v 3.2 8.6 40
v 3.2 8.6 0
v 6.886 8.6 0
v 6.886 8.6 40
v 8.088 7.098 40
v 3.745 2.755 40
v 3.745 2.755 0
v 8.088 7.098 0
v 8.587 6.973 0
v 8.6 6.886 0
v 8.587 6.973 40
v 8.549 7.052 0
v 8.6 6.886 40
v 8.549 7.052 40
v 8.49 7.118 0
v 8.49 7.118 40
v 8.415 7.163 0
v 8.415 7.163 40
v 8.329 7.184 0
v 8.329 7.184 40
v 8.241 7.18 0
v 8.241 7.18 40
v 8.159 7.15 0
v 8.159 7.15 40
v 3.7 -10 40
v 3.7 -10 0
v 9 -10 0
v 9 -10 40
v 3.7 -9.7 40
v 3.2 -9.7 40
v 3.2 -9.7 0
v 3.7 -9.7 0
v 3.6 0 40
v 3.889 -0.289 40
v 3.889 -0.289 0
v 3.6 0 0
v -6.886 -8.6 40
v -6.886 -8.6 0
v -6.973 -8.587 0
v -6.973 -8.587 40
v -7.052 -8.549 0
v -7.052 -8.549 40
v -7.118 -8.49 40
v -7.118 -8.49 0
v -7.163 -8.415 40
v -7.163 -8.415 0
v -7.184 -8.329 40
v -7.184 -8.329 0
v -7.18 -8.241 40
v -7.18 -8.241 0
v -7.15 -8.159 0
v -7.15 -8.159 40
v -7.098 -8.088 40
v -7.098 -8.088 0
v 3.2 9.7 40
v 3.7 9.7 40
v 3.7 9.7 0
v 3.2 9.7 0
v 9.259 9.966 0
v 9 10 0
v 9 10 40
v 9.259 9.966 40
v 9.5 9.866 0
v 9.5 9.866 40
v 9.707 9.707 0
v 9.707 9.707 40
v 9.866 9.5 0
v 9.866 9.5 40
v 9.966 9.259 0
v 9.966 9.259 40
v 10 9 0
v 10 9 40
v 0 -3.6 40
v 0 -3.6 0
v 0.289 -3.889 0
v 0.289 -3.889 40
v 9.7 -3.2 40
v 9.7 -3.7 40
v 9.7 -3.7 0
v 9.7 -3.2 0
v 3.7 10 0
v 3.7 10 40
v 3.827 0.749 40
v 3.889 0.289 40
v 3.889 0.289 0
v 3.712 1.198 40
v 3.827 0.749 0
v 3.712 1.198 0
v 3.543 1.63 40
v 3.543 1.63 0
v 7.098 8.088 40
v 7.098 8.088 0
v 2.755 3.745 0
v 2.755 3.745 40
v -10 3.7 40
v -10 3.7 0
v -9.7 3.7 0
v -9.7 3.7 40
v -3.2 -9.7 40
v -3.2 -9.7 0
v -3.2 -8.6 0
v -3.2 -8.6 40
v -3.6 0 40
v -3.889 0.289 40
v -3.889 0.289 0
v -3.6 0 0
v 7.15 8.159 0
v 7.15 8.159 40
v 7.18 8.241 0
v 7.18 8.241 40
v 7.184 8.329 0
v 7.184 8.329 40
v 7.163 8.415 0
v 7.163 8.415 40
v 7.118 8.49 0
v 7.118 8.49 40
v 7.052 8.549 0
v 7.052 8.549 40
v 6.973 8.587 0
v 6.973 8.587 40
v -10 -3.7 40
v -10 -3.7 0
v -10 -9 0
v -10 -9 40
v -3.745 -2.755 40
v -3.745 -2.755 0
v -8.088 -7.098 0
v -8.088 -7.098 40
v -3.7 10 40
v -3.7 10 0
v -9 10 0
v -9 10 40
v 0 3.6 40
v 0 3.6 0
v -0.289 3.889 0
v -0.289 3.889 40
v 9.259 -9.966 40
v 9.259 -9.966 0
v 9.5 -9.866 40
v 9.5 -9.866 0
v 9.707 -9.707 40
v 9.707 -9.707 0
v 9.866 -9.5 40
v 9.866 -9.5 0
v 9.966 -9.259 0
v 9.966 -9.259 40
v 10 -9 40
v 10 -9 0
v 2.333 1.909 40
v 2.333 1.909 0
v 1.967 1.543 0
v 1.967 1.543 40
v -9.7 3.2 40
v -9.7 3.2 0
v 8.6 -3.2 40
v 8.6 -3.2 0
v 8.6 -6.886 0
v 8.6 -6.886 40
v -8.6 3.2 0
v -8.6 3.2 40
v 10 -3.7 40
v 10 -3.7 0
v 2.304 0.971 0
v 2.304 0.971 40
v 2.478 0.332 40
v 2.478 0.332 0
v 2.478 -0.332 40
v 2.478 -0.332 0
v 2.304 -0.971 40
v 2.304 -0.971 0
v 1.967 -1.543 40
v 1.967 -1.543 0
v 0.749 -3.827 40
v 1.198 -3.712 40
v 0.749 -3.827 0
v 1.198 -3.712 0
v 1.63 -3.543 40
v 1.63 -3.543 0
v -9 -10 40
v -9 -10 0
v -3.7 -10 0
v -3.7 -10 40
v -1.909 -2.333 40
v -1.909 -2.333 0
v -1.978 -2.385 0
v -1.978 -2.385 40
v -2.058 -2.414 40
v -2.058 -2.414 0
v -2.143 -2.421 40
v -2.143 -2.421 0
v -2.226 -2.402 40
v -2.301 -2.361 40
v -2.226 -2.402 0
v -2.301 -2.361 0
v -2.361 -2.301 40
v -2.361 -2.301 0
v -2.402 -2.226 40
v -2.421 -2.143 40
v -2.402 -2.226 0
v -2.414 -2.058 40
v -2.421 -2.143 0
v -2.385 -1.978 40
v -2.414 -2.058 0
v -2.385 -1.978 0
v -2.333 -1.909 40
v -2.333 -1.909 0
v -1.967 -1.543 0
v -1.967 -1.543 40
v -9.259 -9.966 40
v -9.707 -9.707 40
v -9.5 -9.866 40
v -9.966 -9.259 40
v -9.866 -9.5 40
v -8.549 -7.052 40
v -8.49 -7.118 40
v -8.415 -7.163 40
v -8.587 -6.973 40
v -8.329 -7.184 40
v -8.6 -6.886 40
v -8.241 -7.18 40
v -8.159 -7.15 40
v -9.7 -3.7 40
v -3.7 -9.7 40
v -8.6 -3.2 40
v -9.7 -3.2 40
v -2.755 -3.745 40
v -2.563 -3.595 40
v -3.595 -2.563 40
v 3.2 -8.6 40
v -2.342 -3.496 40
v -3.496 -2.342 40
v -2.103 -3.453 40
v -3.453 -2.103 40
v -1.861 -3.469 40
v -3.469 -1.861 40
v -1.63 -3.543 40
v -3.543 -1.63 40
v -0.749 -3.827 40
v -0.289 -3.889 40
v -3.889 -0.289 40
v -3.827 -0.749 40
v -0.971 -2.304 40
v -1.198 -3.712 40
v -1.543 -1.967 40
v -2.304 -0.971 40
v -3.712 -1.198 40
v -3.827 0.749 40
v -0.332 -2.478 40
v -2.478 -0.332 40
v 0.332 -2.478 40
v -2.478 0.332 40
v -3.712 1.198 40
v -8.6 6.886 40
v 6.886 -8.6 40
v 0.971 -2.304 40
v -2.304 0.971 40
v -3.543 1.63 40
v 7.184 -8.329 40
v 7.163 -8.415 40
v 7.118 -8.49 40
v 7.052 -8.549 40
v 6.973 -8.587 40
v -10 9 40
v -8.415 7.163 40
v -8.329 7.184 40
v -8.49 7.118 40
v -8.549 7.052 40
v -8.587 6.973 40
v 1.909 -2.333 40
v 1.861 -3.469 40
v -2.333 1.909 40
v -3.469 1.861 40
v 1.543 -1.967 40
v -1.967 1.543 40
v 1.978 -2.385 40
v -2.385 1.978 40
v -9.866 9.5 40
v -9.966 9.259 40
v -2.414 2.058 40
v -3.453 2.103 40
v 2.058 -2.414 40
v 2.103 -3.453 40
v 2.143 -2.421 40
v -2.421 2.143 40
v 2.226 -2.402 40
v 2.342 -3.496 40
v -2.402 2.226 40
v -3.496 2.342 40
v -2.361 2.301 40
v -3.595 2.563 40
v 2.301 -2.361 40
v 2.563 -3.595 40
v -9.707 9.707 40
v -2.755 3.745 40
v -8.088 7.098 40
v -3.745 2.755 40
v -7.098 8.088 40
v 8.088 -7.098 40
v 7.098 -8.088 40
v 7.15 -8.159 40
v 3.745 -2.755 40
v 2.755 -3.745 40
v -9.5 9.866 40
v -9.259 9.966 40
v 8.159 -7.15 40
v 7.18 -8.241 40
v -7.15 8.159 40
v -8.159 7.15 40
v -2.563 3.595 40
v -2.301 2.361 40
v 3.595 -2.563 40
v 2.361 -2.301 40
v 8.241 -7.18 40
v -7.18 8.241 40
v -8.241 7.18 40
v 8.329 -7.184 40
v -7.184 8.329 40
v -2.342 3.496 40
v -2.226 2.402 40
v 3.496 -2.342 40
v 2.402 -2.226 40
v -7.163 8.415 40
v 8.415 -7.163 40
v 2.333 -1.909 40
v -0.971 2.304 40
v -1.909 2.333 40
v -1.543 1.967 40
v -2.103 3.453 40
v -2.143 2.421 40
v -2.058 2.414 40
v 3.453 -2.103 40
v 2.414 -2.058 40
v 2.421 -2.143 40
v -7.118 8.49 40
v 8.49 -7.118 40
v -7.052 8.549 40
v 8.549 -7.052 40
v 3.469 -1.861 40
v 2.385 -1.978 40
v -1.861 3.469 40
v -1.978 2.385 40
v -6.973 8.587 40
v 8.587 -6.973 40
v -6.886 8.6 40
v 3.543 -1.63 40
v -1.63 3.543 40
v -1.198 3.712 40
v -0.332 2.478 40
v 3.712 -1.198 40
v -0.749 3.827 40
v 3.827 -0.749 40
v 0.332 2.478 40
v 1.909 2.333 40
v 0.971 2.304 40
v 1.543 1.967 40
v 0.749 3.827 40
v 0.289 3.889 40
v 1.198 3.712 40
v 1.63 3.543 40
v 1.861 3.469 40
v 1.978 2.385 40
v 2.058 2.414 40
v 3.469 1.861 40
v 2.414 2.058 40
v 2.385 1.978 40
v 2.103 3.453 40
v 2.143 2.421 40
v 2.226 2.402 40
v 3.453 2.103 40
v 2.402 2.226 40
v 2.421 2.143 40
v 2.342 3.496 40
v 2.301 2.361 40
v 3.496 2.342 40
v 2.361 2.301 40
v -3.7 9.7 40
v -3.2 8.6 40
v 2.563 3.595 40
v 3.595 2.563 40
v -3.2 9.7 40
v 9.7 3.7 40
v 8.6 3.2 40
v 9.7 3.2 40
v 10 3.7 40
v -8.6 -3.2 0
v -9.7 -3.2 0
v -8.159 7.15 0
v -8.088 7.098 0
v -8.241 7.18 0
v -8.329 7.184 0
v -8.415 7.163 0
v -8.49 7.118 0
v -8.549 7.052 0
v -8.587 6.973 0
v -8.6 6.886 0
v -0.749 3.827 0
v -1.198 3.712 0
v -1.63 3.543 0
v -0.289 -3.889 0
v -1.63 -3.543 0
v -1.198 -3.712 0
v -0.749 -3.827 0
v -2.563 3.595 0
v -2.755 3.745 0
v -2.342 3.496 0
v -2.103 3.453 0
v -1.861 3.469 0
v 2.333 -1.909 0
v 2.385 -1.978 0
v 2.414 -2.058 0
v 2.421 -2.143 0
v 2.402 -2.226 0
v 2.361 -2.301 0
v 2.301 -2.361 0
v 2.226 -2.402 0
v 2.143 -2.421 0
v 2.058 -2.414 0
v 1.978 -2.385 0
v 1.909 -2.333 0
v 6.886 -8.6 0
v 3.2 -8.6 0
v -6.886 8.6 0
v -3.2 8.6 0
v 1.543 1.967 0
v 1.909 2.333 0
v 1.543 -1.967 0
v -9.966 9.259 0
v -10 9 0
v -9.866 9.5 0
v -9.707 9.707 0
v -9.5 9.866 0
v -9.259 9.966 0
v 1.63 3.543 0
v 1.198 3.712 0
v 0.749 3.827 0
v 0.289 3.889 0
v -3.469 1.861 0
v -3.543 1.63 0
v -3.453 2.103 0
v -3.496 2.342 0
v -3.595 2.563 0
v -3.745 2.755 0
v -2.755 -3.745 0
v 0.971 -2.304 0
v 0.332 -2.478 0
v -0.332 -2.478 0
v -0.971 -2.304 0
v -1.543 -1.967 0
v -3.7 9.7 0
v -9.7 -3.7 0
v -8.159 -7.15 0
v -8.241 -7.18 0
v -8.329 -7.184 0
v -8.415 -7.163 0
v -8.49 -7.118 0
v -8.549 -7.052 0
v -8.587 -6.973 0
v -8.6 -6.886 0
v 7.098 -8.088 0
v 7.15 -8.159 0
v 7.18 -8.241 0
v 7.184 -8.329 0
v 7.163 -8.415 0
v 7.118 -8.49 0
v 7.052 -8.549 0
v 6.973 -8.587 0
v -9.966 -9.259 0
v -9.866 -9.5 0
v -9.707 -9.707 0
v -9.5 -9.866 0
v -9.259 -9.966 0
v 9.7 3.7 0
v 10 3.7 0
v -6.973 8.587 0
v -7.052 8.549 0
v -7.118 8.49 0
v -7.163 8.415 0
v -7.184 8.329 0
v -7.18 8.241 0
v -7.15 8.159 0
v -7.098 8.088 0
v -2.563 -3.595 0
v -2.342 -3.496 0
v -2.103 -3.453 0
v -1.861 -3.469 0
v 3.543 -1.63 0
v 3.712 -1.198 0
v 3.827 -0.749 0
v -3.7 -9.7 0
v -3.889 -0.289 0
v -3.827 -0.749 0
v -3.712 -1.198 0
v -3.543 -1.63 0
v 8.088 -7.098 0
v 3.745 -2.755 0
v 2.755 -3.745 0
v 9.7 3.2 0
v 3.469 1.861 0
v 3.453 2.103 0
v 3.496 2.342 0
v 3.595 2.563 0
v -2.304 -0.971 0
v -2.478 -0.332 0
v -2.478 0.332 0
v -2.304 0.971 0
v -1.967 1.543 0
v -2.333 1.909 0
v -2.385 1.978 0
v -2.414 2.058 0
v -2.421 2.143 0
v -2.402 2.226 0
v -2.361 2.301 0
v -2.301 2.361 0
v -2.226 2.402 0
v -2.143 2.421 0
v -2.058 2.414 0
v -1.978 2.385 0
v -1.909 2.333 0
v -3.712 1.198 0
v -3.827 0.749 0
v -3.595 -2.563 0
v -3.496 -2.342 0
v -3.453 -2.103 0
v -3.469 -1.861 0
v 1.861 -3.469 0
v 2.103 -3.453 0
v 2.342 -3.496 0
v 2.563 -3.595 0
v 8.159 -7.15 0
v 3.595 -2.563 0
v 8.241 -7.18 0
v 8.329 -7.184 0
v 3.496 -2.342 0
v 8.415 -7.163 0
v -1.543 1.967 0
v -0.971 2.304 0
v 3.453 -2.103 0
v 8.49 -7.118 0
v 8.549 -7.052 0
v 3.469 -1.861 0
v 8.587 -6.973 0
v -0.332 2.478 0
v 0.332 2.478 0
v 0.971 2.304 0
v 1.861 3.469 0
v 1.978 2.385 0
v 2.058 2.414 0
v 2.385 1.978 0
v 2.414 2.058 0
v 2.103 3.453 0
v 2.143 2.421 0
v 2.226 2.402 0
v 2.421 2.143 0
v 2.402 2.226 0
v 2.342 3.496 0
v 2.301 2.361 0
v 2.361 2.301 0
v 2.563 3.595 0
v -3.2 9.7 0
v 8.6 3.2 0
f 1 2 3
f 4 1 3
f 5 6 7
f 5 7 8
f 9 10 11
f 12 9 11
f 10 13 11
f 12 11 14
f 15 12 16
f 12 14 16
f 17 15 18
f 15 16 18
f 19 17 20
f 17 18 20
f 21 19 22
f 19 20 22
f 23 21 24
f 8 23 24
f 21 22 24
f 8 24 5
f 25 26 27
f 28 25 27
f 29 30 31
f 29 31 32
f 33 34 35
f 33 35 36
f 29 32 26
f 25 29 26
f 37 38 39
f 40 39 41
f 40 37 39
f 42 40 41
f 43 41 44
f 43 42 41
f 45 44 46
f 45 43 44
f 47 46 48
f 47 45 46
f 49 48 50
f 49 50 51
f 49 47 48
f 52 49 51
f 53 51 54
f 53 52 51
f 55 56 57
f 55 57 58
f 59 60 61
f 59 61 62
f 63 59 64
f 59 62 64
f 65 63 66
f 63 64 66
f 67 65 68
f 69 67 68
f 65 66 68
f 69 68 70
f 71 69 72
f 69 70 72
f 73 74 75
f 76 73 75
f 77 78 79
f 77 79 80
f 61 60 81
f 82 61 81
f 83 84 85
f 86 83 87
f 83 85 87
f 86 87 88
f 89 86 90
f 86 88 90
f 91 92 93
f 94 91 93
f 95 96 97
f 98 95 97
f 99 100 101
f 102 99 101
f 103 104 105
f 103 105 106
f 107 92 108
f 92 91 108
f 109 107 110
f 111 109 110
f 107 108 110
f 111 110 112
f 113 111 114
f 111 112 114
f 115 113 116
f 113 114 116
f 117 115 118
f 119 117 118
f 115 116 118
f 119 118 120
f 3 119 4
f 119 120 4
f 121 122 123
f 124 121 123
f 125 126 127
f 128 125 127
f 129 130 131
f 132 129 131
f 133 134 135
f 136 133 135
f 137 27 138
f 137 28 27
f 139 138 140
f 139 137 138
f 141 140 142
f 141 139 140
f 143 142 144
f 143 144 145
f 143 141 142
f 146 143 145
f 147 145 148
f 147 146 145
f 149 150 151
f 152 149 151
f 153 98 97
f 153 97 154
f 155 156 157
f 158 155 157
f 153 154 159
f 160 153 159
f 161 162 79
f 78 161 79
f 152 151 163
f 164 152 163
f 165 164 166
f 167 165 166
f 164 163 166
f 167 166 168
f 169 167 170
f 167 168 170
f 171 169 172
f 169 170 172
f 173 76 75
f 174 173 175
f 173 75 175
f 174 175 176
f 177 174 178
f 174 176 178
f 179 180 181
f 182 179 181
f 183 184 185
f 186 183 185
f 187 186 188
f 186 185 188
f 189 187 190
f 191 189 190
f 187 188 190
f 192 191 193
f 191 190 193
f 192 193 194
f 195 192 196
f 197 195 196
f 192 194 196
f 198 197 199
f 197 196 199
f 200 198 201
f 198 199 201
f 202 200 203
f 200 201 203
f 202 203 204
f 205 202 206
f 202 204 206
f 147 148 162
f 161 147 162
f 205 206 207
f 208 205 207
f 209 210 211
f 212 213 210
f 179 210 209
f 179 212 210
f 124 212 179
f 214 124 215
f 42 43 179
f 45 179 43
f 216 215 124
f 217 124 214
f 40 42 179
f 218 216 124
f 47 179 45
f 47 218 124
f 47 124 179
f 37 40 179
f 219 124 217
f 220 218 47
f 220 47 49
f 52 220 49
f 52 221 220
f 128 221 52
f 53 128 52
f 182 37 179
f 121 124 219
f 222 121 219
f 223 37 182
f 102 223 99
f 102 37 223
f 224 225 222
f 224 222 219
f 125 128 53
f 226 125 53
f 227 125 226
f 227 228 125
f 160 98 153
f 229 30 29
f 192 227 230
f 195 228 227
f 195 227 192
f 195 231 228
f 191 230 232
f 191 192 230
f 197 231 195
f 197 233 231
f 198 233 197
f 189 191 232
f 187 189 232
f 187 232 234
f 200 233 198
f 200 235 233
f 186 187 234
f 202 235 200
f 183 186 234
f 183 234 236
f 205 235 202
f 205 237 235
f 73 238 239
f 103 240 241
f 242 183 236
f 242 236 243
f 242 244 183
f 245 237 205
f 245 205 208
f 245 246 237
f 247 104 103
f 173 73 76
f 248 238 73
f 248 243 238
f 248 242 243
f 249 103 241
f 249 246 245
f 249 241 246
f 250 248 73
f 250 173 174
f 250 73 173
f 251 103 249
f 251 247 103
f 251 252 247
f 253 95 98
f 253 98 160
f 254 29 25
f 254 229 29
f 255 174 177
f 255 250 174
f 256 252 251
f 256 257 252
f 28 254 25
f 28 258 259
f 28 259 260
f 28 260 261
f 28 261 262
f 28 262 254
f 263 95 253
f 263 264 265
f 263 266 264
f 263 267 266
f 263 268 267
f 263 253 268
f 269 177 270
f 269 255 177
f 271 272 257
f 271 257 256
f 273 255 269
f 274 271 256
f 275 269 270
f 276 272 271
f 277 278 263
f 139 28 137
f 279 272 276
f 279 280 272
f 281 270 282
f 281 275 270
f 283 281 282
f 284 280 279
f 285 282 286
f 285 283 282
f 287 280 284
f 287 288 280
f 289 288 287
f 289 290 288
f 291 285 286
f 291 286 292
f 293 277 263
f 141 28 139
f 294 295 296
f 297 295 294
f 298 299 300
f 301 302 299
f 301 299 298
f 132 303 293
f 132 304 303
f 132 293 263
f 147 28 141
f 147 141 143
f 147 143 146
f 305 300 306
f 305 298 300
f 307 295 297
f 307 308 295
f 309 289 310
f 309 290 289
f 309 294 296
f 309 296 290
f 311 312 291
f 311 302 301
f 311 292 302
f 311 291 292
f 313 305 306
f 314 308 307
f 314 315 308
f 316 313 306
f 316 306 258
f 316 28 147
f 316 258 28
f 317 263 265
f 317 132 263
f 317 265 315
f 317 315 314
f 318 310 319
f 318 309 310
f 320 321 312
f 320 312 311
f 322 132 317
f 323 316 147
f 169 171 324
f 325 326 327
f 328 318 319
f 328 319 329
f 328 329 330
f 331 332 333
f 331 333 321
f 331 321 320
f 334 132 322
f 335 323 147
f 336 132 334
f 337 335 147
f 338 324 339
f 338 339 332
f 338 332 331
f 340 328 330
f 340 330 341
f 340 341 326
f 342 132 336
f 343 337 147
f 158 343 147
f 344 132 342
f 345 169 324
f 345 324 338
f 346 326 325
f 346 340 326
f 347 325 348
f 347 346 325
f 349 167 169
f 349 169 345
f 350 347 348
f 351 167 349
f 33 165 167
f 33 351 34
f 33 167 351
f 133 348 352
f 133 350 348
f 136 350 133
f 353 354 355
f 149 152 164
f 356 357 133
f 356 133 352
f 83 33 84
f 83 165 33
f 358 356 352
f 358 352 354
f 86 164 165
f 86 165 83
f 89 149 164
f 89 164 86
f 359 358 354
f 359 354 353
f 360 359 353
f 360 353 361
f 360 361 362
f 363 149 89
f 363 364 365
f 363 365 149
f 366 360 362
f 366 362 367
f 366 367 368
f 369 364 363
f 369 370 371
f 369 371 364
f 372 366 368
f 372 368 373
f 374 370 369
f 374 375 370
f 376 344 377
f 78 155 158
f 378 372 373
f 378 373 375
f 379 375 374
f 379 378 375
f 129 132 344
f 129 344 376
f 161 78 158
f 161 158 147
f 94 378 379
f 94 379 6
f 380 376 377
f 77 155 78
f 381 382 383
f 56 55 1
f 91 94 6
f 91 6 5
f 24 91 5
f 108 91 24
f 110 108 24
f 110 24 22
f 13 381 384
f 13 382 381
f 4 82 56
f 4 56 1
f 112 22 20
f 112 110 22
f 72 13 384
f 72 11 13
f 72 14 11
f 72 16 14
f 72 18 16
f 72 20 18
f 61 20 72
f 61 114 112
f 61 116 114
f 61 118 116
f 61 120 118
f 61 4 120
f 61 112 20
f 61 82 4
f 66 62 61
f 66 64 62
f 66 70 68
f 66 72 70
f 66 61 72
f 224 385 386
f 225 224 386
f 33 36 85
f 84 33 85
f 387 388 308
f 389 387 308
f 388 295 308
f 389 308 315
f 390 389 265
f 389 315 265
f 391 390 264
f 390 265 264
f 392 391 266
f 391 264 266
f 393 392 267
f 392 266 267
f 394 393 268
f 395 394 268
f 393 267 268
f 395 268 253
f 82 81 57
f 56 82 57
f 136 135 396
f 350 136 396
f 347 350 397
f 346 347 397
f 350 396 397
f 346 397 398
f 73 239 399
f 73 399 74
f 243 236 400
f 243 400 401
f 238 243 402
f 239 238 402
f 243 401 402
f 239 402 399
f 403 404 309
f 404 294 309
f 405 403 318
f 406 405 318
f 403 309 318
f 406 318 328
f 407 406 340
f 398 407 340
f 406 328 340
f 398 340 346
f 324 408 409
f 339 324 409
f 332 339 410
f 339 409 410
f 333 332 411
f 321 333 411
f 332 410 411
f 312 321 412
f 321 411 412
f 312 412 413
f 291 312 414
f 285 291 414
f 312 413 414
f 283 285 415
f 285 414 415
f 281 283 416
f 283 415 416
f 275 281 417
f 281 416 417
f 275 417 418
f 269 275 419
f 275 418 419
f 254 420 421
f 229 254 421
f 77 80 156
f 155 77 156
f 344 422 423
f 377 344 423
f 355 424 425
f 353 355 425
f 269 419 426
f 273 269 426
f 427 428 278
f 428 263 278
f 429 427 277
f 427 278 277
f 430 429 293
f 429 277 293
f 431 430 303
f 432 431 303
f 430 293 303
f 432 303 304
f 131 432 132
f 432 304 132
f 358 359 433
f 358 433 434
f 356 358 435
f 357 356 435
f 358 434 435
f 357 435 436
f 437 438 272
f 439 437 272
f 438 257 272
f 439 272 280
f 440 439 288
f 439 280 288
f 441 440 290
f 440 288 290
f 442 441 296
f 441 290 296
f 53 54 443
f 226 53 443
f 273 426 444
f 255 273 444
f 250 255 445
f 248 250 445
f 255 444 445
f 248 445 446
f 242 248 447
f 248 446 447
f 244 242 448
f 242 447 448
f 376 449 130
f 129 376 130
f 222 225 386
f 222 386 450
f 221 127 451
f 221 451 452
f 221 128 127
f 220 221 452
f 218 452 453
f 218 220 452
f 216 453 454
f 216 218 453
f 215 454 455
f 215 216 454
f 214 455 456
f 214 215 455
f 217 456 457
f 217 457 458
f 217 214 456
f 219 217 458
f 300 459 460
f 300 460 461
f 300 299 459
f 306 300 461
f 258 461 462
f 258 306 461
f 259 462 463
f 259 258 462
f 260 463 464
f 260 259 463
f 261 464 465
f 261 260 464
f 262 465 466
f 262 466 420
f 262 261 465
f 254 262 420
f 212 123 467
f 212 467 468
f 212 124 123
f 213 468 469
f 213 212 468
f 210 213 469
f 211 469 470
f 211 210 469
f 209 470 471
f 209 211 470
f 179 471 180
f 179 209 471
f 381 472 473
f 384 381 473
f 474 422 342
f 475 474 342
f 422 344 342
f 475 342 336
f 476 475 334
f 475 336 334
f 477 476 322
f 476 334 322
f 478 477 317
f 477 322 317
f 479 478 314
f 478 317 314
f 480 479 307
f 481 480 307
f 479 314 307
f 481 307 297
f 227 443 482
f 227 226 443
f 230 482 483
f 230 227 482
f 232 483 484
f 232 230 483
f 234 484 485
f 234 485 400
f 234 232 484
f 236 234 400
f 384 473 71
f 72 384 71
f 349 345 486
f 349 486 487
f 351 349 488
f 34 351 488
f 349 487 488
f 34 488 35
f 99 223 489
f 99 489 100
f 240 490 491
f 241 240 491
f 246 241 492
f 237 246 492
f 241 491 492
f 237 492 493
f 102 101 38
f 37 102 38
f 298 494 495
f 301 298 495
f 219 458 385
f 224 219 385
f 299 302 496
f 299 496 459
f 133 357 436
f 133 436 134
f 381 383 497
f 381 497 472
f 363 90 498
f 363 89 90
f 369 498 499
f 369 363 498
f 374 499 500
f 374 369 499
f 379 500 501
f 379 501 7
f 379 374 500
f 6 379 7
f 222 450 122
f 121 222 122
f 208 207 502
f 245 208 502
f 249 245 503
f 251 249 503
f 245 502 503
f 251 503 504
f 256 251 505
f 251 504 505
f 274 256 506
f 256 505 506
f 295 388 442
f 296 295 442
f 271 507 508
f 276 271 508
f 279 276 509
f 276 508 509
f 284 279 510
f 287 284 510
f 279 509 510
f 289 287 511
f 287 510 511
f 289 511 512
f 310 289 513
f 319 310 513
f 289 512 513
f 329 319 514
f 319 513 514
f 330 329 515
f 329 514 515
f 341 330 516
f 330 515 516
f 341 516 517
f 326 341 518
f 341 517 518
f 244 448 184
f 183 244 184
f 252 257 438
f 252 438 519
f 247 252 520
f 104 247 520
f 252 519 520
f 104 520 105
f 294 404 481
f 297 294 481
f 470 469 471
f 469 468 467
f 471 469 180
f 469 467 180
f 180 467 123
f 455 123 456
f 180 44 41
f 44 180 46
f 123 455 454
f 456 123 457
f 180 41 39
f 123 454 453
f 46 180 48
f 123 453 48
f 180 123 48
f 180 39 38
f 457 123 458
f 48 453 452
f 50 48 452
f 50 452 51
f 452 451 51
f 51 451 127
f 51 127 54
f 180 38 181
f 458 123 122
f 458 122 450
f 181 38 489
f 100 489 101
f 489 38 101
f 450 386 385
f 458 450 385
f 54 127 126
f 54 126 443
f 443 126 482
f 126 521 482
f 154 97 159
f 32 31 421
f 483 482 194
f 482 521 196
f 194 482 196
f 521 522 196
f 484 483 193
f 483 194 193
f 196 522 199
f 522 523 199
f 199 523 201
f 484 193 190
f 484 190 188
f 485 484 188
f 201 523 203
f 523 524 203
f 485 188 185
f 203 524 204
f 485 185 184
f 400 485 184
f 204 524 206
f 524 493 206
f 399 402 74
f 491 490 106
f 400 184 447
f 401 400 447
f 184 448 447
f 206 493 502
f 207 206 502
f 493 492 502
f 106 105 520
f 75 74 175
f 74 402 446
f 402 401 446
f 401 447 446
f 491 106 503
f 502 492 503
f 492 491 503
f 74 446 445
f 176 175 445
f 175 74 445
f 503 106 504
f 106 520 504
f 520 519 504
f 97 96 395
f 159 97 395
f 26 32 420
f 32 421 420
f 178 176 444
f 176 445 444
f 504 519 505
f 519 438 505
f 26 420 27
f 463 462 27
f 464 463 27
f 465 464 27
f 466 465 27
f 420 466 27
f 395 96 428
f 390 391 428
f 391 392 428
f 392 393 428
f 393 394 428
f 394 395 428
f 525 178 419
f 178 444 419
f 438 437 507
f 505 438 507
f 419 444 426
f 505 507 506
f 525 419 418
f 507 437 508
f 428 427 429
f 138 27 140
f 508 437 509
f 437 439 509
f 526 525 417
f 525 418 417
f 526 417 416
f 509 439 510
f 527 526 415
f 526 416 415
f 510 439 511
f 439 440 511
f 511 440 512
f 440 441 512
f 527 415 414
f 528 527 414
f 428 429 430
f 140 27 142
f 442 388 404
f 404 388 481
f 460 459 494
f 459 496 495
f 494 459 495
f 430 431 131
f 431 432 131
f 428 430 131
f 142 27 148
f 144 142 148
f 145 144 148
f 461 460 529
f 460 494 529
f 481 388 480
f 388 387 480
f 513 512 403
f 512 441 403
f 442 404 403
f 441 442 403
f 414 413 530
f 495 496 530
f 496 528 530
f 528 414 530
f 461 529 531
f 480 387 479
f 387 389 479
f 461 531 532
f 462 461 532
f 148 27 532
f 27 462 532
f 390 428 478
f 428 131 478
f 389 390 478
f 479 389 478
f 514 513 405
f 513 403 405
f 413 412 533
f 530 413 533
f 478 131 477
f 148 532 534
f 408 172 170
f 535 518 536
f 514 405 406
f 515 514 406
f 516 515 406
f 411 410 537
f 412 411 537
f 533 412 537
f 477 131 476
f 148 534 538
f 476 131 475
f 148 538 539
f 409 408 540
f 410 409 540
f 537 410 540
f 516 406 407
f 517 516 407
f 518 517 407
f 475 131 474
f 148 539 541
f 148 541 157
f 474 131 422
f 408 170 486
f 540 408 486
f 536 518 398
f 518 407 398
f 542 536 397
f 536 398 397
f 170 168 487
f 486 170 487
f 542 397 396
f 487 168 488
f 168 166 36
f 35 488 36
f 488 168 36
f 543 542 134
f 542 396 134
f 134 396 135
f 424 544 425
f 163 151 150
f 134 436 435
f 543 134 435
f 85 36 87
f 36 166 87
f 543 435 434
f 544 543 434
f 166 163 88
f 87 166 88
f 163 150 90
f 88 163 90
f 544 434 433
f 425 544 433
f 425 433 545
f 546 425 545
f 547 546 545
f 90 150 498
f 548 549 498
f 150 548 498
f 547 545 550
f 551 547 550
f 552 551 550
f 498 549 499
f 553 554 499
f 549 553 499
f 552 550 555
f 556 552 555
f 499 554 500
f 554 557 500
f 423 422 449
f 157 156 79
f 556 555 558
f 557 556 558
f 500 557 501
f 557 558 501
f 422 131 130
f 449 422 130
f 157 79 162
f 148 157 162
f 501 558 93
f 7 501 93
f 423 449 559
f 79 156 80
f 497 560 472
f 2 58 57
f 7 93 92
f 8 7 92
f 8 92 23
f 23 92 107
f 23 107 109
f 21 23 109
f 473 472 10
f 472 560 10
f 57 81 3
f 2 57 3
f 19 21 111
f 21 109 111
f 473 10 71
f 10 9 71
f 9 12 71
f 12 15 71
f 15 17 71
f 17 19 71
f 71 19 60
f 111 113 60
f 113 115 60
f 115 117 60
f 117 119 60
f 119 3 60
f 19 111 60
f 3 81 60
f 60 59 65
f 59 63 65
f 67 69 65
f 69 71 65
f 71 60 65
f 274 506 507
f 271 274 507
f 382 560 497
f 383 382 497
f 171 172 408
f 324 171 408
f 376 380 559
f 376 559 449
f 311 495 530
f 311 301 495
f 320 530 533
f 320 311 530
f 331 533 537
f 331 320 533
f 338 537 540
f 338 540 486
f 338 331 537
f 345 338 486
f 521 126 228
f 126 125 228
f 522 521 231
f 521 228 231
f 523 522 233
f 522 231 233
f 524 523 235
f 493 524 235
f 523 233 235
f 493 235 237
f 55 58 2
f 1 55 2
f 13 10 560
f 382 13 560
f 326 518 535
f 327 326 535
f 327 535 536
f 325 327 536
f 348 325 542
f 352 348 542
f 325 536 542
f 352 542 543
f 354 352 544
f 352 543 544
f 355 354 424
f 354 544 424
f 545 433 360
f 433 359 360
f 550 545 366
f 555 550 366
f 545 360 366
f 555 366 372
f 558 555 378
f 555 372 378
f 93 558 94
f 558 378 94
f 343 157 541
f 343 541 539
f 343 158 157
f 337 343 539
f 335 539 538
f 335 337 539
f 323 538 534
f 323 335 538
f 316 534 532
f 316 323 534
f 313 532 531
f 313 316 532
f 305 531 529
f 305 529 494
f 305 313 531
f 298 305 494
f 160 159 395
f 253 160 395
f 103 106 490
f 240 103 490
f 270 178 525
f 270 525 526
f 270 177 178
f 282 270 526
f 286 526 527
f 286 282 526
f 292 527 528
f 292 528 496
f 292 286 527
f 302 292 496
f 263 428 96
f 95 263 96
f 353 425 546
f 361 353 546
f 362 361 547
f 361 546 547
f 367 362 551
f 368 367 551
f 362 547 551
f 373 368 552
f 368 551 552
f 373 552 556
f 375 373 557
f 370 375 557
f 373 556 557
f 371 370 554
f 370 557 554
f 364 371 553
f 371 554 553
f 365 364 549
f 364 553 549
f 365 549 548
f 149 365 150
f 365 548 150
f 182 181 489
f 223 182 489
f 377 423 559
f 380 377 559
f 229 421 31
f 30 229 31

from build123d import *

# Parameters (mm, degrees)
Y_KSEKLIK_EKSTR_ZYON1_DEPTH = 40
RADYUS1_R                   = 1
RADYUS2_R                   = 0.3
RADYUS3_R                   = 1


with BuildPart() as part:
    # Çizim1 → Yükseklik-Ekstrüzyon1 (new body)
    with BuildSketch(Plane.XY):
        with BuildLine():
            Line((-8.6, -3.2), (-9.7, -3.2))
            Line((-9.7, -3.2), (-9.7, -3.7))
            Line((-9.7, -3.7), (-10, -3.7))
            Line((-10, -3.7), (-10, -10))
            Line((-10, -10), (-3.7, -10))
            Line((-3.7, -10), (-3.7, -9.7))
            Line((-3.7, -9.7), (-3.2, -9.7))
            Line((-3.2, -9.7), (-3.2, -8.6))
            Line((-3.2, -8.6), (-7.610050506, -8.6))
            Line((-7.610050506, -8.6), (-2.217957246, -3.20790674))
            ThreePointArc((-2.217957246, -3.20790674), (-1.299073648, -3.677282646), (-0.289258242, -3.889258242))
            Line((-0.289258242, -3.889258242), (0, -3.6))
            Line((0, -3.6), (0.289258242, -3.889258242))
            ThreePointArc((0.289258242, -3.889258242), (1.299073648, -3.677282646), (2.217957246, -3.20790674))
            Line((2.217957246, -3.20790674), (7.610050506, -8.6))
            Line((7.610050506, -8.6), (3.2, -8.6))
            Line((3.2, -8.6), (3.2, -9.7))
            Line((3.2, -9.7), (3.7, -9.7))
            Line((3.7, -9.7), (3.7, -10))
            Line((3.7, -10), (10, -10))
            Line((10, -10), (10, -3.7))
            Line((10, -3.7), (9.7, -3.7))
            Line((9.7, -3.7), (9.7, -3.2))
            Line((9.7, -3.2), (8.6, -3.2))
            Line((8.6, -3.2), (8.6, -7.610050506))
            Line((8.6, -7.610050506), (3.20790674, -2.217957246))
            ThreePointArc((3.20790674, -2.217957246), (3.677282646, -1.299073648), (3.889258242, -0.289258242))
            Line((3.889258242, -0.289258242), (3.6, 0))
            Line((3.6, 0), (3.889258242, 0.289258242))
            ThreePointArc((3.889258242, 0.289258242), (3.677282646, 1.299073648), (3.20790674, 2.217957246))
            Line((3.20790674, 2.217957246), (8.6, 7.610050506))
            Line((8.6, 7.610050506), (8.6, 3.2))
            Line((8.6, 3.2), (9.7, 3.2))
            Line((9.7, 3.2), (9.7, 3.7))
            Line((9.7, 3.7), (10, 3.7))
            Line((10, 3.7), (10, 10))
            Line((10, 10), (3.7, 10))
            Line((3.7, 10), (3.7, 9.7))
            Line((3.7, 9.7), (3.2, 9.7))
            Line((3.2, 9.7), (3.2, 8.6))
            Line((3.2, 8.6), (7.610050506, 8.6))
            Line((7.610050506, 8.6), (2.217957246, 3.20790674))
            ThreePointArc((2.217957246, 3.20790674), (1.299073648, 3.677282646), (0.289258242, 3.889258242))
            Line((0.289258242, 3.889258242), (0, 3.6))
            Line((0, 3.6), (-0.289258242, 3.889258242))
            ThreePointArc((-0.289258242, 3.889258242), (-1.299073648, 3.677282646), (-2.217957246, 3.20790674))
            Line((-2.217957246, 3.20790674), (-7.610050506, 8.6))
            Line((-7.610050506, 8.6), (-3.2, 8.6))
            Line((-3.2, 8.6), (-3.2, 9.7))
            Line((-3.2, 9.7), (-3.7, 9.7))
            Line((-3.7, 9.7), (-3.7, 10))
            Line((-3.7, 10), (-10, 10))
            Line((-10, 10), (-10, 3.7))
            Line((-10, 3.7), (-9.7, 3.7))
            Line((-9.7, 3.7), (-9.7, 3.2))
            Line((-9.7, 3.2), (-8.6, 3.2))
            Line((-8.6, 3.2), (-8.6, 7.610050506))
            Line((-8.6, 7.610050506), (-3.20790674, 2.217957246))
            ThreePointArc((-3.20790674, 2.217957246), (-3.677282646, 1.299073648), (-3.889258242, 0.289258242))
            Line((-3.889258242, 0.289258242), (-3.6, 0))
            Line((-3.6, 0), (-3.889258242, -0.289258242))
            ThreePointArc((-3.889258242, -0.289258242), (-3.677282646, -1.299073648), (-3.20790674, -2.217957246))
            Line((-3.20790674, -2.217957246), (-8.6, -7.610050506))
            Line((-8.6, -7.610050506), (-8.6, -3.2))
        make_face()
        with BuildLine():
            Line((1.967124912, -1.542860843), (2.333452378, -1.909188309))
            ThreePointArc((2.333452378, -1.909188309), (2.333452378, -2.333452378), (1.909188309, -2.333452378))
            Line((1.909188309, -2.333452378), (1.542860843, -1.967124912))
            ThreePointArc((1.542860843, -1.967124912), (0, -2.5), (-1.542860843, -1.967124912))
            Line((-1.542860843, -1.967124912), (-1.909188309, -2.333452378))
            ThreePointArc((-1.909188309, -2.333452378), (-2.333452378, -2.333452378), (-2.333452378, -1.909188309))
            Line((-2.333452378, -1.909188309), (-1.967124912, -1.542860843))
            ThreePointArc((-1.967124912, -1.542860843), (-2.5, 0), (-1.967124912, 1.542860843))
            Line((-1.967124912, 1.542860843), (-2.333452378, 1.909188309))
            ThreePointArc((-2.333452378, 1.909188309), (-2.333452378, 2.333452378), (-1.909188309, 2.333452378))
            Line((-1.909188309, 2.333452378), (-1.542860843, 1.967124912))
            ThreePointArc((-1.542860843, 1.967124912), (0, 2.5), (1.542860843, 1.967124912))
            Line((1.542860843, 1.967124912), (1.909188309, 2.333452378))
            ThreePointArc((1.909188309, 2.333452378), (2.333452378, 2.333452378), (2.333452378, 1.909188309))
            Line((2.333452378, 1.909188309), (1.967124912, 1.542860843))
            ThreePointArc((1.967124912, 1.542860843), (2.5, 0), (1.967124912, -1.542860843))
        make_face(mode=Mode.SUBTRACT)
    extrude(amount=Y_KSEKLIK_EKSTR_ZYON1_DEPTH)

    # Radyus1
    radyus1_edges = [part.edges().sort_by_distance(p)[0] for p in [
        (-2.217957246, -3.20790674, 20),
        (-3.20790674, -2.217957246, 20),
        (-3.20790674, 2.217957246, 20),
        (-2.217957246, 3.20790674, 20),
        (2.217957246, 3.20790674, 20),
        (3.20790674, 2.217957246, 20),
        (3.20790674, -2.217957246, 20),
        (2.217957246, -3.20790674, 20),
    ]]
    fillet(radyus1_edges, radius=RADYUS1_R)

    # Radyus2
    radyus2_edges = [part.edges().sort_by_distance(p)[0] for p in [
        (-7.610050506, -8.6, 20),
        (-8.6, -7.610050506, 20),
        (-8.6, 7.610050506, 20),
        (-7.610050506, 8.6, 20),
        (7.610050506, 8.6, 20),
        (8.6, 7.610050506, 20),
        (8.6, -7.610050506, 20),
        (7.610050506, -8.6, 20),
    ]]
    fillet(radyus2_edges, radius=RADYUS2_R)

    # Radyus3
    radyus3_edges = [part.edges().sort_by_distance(p)[0] for p in [
        (-10, -10, 20),
        (-10, 10, 20),
        (10, 10, 20),
        (10, -10, 20),
    ]]
    fillet(radyus3_edges, radius=RADYUS3_R)


solid = part.part
